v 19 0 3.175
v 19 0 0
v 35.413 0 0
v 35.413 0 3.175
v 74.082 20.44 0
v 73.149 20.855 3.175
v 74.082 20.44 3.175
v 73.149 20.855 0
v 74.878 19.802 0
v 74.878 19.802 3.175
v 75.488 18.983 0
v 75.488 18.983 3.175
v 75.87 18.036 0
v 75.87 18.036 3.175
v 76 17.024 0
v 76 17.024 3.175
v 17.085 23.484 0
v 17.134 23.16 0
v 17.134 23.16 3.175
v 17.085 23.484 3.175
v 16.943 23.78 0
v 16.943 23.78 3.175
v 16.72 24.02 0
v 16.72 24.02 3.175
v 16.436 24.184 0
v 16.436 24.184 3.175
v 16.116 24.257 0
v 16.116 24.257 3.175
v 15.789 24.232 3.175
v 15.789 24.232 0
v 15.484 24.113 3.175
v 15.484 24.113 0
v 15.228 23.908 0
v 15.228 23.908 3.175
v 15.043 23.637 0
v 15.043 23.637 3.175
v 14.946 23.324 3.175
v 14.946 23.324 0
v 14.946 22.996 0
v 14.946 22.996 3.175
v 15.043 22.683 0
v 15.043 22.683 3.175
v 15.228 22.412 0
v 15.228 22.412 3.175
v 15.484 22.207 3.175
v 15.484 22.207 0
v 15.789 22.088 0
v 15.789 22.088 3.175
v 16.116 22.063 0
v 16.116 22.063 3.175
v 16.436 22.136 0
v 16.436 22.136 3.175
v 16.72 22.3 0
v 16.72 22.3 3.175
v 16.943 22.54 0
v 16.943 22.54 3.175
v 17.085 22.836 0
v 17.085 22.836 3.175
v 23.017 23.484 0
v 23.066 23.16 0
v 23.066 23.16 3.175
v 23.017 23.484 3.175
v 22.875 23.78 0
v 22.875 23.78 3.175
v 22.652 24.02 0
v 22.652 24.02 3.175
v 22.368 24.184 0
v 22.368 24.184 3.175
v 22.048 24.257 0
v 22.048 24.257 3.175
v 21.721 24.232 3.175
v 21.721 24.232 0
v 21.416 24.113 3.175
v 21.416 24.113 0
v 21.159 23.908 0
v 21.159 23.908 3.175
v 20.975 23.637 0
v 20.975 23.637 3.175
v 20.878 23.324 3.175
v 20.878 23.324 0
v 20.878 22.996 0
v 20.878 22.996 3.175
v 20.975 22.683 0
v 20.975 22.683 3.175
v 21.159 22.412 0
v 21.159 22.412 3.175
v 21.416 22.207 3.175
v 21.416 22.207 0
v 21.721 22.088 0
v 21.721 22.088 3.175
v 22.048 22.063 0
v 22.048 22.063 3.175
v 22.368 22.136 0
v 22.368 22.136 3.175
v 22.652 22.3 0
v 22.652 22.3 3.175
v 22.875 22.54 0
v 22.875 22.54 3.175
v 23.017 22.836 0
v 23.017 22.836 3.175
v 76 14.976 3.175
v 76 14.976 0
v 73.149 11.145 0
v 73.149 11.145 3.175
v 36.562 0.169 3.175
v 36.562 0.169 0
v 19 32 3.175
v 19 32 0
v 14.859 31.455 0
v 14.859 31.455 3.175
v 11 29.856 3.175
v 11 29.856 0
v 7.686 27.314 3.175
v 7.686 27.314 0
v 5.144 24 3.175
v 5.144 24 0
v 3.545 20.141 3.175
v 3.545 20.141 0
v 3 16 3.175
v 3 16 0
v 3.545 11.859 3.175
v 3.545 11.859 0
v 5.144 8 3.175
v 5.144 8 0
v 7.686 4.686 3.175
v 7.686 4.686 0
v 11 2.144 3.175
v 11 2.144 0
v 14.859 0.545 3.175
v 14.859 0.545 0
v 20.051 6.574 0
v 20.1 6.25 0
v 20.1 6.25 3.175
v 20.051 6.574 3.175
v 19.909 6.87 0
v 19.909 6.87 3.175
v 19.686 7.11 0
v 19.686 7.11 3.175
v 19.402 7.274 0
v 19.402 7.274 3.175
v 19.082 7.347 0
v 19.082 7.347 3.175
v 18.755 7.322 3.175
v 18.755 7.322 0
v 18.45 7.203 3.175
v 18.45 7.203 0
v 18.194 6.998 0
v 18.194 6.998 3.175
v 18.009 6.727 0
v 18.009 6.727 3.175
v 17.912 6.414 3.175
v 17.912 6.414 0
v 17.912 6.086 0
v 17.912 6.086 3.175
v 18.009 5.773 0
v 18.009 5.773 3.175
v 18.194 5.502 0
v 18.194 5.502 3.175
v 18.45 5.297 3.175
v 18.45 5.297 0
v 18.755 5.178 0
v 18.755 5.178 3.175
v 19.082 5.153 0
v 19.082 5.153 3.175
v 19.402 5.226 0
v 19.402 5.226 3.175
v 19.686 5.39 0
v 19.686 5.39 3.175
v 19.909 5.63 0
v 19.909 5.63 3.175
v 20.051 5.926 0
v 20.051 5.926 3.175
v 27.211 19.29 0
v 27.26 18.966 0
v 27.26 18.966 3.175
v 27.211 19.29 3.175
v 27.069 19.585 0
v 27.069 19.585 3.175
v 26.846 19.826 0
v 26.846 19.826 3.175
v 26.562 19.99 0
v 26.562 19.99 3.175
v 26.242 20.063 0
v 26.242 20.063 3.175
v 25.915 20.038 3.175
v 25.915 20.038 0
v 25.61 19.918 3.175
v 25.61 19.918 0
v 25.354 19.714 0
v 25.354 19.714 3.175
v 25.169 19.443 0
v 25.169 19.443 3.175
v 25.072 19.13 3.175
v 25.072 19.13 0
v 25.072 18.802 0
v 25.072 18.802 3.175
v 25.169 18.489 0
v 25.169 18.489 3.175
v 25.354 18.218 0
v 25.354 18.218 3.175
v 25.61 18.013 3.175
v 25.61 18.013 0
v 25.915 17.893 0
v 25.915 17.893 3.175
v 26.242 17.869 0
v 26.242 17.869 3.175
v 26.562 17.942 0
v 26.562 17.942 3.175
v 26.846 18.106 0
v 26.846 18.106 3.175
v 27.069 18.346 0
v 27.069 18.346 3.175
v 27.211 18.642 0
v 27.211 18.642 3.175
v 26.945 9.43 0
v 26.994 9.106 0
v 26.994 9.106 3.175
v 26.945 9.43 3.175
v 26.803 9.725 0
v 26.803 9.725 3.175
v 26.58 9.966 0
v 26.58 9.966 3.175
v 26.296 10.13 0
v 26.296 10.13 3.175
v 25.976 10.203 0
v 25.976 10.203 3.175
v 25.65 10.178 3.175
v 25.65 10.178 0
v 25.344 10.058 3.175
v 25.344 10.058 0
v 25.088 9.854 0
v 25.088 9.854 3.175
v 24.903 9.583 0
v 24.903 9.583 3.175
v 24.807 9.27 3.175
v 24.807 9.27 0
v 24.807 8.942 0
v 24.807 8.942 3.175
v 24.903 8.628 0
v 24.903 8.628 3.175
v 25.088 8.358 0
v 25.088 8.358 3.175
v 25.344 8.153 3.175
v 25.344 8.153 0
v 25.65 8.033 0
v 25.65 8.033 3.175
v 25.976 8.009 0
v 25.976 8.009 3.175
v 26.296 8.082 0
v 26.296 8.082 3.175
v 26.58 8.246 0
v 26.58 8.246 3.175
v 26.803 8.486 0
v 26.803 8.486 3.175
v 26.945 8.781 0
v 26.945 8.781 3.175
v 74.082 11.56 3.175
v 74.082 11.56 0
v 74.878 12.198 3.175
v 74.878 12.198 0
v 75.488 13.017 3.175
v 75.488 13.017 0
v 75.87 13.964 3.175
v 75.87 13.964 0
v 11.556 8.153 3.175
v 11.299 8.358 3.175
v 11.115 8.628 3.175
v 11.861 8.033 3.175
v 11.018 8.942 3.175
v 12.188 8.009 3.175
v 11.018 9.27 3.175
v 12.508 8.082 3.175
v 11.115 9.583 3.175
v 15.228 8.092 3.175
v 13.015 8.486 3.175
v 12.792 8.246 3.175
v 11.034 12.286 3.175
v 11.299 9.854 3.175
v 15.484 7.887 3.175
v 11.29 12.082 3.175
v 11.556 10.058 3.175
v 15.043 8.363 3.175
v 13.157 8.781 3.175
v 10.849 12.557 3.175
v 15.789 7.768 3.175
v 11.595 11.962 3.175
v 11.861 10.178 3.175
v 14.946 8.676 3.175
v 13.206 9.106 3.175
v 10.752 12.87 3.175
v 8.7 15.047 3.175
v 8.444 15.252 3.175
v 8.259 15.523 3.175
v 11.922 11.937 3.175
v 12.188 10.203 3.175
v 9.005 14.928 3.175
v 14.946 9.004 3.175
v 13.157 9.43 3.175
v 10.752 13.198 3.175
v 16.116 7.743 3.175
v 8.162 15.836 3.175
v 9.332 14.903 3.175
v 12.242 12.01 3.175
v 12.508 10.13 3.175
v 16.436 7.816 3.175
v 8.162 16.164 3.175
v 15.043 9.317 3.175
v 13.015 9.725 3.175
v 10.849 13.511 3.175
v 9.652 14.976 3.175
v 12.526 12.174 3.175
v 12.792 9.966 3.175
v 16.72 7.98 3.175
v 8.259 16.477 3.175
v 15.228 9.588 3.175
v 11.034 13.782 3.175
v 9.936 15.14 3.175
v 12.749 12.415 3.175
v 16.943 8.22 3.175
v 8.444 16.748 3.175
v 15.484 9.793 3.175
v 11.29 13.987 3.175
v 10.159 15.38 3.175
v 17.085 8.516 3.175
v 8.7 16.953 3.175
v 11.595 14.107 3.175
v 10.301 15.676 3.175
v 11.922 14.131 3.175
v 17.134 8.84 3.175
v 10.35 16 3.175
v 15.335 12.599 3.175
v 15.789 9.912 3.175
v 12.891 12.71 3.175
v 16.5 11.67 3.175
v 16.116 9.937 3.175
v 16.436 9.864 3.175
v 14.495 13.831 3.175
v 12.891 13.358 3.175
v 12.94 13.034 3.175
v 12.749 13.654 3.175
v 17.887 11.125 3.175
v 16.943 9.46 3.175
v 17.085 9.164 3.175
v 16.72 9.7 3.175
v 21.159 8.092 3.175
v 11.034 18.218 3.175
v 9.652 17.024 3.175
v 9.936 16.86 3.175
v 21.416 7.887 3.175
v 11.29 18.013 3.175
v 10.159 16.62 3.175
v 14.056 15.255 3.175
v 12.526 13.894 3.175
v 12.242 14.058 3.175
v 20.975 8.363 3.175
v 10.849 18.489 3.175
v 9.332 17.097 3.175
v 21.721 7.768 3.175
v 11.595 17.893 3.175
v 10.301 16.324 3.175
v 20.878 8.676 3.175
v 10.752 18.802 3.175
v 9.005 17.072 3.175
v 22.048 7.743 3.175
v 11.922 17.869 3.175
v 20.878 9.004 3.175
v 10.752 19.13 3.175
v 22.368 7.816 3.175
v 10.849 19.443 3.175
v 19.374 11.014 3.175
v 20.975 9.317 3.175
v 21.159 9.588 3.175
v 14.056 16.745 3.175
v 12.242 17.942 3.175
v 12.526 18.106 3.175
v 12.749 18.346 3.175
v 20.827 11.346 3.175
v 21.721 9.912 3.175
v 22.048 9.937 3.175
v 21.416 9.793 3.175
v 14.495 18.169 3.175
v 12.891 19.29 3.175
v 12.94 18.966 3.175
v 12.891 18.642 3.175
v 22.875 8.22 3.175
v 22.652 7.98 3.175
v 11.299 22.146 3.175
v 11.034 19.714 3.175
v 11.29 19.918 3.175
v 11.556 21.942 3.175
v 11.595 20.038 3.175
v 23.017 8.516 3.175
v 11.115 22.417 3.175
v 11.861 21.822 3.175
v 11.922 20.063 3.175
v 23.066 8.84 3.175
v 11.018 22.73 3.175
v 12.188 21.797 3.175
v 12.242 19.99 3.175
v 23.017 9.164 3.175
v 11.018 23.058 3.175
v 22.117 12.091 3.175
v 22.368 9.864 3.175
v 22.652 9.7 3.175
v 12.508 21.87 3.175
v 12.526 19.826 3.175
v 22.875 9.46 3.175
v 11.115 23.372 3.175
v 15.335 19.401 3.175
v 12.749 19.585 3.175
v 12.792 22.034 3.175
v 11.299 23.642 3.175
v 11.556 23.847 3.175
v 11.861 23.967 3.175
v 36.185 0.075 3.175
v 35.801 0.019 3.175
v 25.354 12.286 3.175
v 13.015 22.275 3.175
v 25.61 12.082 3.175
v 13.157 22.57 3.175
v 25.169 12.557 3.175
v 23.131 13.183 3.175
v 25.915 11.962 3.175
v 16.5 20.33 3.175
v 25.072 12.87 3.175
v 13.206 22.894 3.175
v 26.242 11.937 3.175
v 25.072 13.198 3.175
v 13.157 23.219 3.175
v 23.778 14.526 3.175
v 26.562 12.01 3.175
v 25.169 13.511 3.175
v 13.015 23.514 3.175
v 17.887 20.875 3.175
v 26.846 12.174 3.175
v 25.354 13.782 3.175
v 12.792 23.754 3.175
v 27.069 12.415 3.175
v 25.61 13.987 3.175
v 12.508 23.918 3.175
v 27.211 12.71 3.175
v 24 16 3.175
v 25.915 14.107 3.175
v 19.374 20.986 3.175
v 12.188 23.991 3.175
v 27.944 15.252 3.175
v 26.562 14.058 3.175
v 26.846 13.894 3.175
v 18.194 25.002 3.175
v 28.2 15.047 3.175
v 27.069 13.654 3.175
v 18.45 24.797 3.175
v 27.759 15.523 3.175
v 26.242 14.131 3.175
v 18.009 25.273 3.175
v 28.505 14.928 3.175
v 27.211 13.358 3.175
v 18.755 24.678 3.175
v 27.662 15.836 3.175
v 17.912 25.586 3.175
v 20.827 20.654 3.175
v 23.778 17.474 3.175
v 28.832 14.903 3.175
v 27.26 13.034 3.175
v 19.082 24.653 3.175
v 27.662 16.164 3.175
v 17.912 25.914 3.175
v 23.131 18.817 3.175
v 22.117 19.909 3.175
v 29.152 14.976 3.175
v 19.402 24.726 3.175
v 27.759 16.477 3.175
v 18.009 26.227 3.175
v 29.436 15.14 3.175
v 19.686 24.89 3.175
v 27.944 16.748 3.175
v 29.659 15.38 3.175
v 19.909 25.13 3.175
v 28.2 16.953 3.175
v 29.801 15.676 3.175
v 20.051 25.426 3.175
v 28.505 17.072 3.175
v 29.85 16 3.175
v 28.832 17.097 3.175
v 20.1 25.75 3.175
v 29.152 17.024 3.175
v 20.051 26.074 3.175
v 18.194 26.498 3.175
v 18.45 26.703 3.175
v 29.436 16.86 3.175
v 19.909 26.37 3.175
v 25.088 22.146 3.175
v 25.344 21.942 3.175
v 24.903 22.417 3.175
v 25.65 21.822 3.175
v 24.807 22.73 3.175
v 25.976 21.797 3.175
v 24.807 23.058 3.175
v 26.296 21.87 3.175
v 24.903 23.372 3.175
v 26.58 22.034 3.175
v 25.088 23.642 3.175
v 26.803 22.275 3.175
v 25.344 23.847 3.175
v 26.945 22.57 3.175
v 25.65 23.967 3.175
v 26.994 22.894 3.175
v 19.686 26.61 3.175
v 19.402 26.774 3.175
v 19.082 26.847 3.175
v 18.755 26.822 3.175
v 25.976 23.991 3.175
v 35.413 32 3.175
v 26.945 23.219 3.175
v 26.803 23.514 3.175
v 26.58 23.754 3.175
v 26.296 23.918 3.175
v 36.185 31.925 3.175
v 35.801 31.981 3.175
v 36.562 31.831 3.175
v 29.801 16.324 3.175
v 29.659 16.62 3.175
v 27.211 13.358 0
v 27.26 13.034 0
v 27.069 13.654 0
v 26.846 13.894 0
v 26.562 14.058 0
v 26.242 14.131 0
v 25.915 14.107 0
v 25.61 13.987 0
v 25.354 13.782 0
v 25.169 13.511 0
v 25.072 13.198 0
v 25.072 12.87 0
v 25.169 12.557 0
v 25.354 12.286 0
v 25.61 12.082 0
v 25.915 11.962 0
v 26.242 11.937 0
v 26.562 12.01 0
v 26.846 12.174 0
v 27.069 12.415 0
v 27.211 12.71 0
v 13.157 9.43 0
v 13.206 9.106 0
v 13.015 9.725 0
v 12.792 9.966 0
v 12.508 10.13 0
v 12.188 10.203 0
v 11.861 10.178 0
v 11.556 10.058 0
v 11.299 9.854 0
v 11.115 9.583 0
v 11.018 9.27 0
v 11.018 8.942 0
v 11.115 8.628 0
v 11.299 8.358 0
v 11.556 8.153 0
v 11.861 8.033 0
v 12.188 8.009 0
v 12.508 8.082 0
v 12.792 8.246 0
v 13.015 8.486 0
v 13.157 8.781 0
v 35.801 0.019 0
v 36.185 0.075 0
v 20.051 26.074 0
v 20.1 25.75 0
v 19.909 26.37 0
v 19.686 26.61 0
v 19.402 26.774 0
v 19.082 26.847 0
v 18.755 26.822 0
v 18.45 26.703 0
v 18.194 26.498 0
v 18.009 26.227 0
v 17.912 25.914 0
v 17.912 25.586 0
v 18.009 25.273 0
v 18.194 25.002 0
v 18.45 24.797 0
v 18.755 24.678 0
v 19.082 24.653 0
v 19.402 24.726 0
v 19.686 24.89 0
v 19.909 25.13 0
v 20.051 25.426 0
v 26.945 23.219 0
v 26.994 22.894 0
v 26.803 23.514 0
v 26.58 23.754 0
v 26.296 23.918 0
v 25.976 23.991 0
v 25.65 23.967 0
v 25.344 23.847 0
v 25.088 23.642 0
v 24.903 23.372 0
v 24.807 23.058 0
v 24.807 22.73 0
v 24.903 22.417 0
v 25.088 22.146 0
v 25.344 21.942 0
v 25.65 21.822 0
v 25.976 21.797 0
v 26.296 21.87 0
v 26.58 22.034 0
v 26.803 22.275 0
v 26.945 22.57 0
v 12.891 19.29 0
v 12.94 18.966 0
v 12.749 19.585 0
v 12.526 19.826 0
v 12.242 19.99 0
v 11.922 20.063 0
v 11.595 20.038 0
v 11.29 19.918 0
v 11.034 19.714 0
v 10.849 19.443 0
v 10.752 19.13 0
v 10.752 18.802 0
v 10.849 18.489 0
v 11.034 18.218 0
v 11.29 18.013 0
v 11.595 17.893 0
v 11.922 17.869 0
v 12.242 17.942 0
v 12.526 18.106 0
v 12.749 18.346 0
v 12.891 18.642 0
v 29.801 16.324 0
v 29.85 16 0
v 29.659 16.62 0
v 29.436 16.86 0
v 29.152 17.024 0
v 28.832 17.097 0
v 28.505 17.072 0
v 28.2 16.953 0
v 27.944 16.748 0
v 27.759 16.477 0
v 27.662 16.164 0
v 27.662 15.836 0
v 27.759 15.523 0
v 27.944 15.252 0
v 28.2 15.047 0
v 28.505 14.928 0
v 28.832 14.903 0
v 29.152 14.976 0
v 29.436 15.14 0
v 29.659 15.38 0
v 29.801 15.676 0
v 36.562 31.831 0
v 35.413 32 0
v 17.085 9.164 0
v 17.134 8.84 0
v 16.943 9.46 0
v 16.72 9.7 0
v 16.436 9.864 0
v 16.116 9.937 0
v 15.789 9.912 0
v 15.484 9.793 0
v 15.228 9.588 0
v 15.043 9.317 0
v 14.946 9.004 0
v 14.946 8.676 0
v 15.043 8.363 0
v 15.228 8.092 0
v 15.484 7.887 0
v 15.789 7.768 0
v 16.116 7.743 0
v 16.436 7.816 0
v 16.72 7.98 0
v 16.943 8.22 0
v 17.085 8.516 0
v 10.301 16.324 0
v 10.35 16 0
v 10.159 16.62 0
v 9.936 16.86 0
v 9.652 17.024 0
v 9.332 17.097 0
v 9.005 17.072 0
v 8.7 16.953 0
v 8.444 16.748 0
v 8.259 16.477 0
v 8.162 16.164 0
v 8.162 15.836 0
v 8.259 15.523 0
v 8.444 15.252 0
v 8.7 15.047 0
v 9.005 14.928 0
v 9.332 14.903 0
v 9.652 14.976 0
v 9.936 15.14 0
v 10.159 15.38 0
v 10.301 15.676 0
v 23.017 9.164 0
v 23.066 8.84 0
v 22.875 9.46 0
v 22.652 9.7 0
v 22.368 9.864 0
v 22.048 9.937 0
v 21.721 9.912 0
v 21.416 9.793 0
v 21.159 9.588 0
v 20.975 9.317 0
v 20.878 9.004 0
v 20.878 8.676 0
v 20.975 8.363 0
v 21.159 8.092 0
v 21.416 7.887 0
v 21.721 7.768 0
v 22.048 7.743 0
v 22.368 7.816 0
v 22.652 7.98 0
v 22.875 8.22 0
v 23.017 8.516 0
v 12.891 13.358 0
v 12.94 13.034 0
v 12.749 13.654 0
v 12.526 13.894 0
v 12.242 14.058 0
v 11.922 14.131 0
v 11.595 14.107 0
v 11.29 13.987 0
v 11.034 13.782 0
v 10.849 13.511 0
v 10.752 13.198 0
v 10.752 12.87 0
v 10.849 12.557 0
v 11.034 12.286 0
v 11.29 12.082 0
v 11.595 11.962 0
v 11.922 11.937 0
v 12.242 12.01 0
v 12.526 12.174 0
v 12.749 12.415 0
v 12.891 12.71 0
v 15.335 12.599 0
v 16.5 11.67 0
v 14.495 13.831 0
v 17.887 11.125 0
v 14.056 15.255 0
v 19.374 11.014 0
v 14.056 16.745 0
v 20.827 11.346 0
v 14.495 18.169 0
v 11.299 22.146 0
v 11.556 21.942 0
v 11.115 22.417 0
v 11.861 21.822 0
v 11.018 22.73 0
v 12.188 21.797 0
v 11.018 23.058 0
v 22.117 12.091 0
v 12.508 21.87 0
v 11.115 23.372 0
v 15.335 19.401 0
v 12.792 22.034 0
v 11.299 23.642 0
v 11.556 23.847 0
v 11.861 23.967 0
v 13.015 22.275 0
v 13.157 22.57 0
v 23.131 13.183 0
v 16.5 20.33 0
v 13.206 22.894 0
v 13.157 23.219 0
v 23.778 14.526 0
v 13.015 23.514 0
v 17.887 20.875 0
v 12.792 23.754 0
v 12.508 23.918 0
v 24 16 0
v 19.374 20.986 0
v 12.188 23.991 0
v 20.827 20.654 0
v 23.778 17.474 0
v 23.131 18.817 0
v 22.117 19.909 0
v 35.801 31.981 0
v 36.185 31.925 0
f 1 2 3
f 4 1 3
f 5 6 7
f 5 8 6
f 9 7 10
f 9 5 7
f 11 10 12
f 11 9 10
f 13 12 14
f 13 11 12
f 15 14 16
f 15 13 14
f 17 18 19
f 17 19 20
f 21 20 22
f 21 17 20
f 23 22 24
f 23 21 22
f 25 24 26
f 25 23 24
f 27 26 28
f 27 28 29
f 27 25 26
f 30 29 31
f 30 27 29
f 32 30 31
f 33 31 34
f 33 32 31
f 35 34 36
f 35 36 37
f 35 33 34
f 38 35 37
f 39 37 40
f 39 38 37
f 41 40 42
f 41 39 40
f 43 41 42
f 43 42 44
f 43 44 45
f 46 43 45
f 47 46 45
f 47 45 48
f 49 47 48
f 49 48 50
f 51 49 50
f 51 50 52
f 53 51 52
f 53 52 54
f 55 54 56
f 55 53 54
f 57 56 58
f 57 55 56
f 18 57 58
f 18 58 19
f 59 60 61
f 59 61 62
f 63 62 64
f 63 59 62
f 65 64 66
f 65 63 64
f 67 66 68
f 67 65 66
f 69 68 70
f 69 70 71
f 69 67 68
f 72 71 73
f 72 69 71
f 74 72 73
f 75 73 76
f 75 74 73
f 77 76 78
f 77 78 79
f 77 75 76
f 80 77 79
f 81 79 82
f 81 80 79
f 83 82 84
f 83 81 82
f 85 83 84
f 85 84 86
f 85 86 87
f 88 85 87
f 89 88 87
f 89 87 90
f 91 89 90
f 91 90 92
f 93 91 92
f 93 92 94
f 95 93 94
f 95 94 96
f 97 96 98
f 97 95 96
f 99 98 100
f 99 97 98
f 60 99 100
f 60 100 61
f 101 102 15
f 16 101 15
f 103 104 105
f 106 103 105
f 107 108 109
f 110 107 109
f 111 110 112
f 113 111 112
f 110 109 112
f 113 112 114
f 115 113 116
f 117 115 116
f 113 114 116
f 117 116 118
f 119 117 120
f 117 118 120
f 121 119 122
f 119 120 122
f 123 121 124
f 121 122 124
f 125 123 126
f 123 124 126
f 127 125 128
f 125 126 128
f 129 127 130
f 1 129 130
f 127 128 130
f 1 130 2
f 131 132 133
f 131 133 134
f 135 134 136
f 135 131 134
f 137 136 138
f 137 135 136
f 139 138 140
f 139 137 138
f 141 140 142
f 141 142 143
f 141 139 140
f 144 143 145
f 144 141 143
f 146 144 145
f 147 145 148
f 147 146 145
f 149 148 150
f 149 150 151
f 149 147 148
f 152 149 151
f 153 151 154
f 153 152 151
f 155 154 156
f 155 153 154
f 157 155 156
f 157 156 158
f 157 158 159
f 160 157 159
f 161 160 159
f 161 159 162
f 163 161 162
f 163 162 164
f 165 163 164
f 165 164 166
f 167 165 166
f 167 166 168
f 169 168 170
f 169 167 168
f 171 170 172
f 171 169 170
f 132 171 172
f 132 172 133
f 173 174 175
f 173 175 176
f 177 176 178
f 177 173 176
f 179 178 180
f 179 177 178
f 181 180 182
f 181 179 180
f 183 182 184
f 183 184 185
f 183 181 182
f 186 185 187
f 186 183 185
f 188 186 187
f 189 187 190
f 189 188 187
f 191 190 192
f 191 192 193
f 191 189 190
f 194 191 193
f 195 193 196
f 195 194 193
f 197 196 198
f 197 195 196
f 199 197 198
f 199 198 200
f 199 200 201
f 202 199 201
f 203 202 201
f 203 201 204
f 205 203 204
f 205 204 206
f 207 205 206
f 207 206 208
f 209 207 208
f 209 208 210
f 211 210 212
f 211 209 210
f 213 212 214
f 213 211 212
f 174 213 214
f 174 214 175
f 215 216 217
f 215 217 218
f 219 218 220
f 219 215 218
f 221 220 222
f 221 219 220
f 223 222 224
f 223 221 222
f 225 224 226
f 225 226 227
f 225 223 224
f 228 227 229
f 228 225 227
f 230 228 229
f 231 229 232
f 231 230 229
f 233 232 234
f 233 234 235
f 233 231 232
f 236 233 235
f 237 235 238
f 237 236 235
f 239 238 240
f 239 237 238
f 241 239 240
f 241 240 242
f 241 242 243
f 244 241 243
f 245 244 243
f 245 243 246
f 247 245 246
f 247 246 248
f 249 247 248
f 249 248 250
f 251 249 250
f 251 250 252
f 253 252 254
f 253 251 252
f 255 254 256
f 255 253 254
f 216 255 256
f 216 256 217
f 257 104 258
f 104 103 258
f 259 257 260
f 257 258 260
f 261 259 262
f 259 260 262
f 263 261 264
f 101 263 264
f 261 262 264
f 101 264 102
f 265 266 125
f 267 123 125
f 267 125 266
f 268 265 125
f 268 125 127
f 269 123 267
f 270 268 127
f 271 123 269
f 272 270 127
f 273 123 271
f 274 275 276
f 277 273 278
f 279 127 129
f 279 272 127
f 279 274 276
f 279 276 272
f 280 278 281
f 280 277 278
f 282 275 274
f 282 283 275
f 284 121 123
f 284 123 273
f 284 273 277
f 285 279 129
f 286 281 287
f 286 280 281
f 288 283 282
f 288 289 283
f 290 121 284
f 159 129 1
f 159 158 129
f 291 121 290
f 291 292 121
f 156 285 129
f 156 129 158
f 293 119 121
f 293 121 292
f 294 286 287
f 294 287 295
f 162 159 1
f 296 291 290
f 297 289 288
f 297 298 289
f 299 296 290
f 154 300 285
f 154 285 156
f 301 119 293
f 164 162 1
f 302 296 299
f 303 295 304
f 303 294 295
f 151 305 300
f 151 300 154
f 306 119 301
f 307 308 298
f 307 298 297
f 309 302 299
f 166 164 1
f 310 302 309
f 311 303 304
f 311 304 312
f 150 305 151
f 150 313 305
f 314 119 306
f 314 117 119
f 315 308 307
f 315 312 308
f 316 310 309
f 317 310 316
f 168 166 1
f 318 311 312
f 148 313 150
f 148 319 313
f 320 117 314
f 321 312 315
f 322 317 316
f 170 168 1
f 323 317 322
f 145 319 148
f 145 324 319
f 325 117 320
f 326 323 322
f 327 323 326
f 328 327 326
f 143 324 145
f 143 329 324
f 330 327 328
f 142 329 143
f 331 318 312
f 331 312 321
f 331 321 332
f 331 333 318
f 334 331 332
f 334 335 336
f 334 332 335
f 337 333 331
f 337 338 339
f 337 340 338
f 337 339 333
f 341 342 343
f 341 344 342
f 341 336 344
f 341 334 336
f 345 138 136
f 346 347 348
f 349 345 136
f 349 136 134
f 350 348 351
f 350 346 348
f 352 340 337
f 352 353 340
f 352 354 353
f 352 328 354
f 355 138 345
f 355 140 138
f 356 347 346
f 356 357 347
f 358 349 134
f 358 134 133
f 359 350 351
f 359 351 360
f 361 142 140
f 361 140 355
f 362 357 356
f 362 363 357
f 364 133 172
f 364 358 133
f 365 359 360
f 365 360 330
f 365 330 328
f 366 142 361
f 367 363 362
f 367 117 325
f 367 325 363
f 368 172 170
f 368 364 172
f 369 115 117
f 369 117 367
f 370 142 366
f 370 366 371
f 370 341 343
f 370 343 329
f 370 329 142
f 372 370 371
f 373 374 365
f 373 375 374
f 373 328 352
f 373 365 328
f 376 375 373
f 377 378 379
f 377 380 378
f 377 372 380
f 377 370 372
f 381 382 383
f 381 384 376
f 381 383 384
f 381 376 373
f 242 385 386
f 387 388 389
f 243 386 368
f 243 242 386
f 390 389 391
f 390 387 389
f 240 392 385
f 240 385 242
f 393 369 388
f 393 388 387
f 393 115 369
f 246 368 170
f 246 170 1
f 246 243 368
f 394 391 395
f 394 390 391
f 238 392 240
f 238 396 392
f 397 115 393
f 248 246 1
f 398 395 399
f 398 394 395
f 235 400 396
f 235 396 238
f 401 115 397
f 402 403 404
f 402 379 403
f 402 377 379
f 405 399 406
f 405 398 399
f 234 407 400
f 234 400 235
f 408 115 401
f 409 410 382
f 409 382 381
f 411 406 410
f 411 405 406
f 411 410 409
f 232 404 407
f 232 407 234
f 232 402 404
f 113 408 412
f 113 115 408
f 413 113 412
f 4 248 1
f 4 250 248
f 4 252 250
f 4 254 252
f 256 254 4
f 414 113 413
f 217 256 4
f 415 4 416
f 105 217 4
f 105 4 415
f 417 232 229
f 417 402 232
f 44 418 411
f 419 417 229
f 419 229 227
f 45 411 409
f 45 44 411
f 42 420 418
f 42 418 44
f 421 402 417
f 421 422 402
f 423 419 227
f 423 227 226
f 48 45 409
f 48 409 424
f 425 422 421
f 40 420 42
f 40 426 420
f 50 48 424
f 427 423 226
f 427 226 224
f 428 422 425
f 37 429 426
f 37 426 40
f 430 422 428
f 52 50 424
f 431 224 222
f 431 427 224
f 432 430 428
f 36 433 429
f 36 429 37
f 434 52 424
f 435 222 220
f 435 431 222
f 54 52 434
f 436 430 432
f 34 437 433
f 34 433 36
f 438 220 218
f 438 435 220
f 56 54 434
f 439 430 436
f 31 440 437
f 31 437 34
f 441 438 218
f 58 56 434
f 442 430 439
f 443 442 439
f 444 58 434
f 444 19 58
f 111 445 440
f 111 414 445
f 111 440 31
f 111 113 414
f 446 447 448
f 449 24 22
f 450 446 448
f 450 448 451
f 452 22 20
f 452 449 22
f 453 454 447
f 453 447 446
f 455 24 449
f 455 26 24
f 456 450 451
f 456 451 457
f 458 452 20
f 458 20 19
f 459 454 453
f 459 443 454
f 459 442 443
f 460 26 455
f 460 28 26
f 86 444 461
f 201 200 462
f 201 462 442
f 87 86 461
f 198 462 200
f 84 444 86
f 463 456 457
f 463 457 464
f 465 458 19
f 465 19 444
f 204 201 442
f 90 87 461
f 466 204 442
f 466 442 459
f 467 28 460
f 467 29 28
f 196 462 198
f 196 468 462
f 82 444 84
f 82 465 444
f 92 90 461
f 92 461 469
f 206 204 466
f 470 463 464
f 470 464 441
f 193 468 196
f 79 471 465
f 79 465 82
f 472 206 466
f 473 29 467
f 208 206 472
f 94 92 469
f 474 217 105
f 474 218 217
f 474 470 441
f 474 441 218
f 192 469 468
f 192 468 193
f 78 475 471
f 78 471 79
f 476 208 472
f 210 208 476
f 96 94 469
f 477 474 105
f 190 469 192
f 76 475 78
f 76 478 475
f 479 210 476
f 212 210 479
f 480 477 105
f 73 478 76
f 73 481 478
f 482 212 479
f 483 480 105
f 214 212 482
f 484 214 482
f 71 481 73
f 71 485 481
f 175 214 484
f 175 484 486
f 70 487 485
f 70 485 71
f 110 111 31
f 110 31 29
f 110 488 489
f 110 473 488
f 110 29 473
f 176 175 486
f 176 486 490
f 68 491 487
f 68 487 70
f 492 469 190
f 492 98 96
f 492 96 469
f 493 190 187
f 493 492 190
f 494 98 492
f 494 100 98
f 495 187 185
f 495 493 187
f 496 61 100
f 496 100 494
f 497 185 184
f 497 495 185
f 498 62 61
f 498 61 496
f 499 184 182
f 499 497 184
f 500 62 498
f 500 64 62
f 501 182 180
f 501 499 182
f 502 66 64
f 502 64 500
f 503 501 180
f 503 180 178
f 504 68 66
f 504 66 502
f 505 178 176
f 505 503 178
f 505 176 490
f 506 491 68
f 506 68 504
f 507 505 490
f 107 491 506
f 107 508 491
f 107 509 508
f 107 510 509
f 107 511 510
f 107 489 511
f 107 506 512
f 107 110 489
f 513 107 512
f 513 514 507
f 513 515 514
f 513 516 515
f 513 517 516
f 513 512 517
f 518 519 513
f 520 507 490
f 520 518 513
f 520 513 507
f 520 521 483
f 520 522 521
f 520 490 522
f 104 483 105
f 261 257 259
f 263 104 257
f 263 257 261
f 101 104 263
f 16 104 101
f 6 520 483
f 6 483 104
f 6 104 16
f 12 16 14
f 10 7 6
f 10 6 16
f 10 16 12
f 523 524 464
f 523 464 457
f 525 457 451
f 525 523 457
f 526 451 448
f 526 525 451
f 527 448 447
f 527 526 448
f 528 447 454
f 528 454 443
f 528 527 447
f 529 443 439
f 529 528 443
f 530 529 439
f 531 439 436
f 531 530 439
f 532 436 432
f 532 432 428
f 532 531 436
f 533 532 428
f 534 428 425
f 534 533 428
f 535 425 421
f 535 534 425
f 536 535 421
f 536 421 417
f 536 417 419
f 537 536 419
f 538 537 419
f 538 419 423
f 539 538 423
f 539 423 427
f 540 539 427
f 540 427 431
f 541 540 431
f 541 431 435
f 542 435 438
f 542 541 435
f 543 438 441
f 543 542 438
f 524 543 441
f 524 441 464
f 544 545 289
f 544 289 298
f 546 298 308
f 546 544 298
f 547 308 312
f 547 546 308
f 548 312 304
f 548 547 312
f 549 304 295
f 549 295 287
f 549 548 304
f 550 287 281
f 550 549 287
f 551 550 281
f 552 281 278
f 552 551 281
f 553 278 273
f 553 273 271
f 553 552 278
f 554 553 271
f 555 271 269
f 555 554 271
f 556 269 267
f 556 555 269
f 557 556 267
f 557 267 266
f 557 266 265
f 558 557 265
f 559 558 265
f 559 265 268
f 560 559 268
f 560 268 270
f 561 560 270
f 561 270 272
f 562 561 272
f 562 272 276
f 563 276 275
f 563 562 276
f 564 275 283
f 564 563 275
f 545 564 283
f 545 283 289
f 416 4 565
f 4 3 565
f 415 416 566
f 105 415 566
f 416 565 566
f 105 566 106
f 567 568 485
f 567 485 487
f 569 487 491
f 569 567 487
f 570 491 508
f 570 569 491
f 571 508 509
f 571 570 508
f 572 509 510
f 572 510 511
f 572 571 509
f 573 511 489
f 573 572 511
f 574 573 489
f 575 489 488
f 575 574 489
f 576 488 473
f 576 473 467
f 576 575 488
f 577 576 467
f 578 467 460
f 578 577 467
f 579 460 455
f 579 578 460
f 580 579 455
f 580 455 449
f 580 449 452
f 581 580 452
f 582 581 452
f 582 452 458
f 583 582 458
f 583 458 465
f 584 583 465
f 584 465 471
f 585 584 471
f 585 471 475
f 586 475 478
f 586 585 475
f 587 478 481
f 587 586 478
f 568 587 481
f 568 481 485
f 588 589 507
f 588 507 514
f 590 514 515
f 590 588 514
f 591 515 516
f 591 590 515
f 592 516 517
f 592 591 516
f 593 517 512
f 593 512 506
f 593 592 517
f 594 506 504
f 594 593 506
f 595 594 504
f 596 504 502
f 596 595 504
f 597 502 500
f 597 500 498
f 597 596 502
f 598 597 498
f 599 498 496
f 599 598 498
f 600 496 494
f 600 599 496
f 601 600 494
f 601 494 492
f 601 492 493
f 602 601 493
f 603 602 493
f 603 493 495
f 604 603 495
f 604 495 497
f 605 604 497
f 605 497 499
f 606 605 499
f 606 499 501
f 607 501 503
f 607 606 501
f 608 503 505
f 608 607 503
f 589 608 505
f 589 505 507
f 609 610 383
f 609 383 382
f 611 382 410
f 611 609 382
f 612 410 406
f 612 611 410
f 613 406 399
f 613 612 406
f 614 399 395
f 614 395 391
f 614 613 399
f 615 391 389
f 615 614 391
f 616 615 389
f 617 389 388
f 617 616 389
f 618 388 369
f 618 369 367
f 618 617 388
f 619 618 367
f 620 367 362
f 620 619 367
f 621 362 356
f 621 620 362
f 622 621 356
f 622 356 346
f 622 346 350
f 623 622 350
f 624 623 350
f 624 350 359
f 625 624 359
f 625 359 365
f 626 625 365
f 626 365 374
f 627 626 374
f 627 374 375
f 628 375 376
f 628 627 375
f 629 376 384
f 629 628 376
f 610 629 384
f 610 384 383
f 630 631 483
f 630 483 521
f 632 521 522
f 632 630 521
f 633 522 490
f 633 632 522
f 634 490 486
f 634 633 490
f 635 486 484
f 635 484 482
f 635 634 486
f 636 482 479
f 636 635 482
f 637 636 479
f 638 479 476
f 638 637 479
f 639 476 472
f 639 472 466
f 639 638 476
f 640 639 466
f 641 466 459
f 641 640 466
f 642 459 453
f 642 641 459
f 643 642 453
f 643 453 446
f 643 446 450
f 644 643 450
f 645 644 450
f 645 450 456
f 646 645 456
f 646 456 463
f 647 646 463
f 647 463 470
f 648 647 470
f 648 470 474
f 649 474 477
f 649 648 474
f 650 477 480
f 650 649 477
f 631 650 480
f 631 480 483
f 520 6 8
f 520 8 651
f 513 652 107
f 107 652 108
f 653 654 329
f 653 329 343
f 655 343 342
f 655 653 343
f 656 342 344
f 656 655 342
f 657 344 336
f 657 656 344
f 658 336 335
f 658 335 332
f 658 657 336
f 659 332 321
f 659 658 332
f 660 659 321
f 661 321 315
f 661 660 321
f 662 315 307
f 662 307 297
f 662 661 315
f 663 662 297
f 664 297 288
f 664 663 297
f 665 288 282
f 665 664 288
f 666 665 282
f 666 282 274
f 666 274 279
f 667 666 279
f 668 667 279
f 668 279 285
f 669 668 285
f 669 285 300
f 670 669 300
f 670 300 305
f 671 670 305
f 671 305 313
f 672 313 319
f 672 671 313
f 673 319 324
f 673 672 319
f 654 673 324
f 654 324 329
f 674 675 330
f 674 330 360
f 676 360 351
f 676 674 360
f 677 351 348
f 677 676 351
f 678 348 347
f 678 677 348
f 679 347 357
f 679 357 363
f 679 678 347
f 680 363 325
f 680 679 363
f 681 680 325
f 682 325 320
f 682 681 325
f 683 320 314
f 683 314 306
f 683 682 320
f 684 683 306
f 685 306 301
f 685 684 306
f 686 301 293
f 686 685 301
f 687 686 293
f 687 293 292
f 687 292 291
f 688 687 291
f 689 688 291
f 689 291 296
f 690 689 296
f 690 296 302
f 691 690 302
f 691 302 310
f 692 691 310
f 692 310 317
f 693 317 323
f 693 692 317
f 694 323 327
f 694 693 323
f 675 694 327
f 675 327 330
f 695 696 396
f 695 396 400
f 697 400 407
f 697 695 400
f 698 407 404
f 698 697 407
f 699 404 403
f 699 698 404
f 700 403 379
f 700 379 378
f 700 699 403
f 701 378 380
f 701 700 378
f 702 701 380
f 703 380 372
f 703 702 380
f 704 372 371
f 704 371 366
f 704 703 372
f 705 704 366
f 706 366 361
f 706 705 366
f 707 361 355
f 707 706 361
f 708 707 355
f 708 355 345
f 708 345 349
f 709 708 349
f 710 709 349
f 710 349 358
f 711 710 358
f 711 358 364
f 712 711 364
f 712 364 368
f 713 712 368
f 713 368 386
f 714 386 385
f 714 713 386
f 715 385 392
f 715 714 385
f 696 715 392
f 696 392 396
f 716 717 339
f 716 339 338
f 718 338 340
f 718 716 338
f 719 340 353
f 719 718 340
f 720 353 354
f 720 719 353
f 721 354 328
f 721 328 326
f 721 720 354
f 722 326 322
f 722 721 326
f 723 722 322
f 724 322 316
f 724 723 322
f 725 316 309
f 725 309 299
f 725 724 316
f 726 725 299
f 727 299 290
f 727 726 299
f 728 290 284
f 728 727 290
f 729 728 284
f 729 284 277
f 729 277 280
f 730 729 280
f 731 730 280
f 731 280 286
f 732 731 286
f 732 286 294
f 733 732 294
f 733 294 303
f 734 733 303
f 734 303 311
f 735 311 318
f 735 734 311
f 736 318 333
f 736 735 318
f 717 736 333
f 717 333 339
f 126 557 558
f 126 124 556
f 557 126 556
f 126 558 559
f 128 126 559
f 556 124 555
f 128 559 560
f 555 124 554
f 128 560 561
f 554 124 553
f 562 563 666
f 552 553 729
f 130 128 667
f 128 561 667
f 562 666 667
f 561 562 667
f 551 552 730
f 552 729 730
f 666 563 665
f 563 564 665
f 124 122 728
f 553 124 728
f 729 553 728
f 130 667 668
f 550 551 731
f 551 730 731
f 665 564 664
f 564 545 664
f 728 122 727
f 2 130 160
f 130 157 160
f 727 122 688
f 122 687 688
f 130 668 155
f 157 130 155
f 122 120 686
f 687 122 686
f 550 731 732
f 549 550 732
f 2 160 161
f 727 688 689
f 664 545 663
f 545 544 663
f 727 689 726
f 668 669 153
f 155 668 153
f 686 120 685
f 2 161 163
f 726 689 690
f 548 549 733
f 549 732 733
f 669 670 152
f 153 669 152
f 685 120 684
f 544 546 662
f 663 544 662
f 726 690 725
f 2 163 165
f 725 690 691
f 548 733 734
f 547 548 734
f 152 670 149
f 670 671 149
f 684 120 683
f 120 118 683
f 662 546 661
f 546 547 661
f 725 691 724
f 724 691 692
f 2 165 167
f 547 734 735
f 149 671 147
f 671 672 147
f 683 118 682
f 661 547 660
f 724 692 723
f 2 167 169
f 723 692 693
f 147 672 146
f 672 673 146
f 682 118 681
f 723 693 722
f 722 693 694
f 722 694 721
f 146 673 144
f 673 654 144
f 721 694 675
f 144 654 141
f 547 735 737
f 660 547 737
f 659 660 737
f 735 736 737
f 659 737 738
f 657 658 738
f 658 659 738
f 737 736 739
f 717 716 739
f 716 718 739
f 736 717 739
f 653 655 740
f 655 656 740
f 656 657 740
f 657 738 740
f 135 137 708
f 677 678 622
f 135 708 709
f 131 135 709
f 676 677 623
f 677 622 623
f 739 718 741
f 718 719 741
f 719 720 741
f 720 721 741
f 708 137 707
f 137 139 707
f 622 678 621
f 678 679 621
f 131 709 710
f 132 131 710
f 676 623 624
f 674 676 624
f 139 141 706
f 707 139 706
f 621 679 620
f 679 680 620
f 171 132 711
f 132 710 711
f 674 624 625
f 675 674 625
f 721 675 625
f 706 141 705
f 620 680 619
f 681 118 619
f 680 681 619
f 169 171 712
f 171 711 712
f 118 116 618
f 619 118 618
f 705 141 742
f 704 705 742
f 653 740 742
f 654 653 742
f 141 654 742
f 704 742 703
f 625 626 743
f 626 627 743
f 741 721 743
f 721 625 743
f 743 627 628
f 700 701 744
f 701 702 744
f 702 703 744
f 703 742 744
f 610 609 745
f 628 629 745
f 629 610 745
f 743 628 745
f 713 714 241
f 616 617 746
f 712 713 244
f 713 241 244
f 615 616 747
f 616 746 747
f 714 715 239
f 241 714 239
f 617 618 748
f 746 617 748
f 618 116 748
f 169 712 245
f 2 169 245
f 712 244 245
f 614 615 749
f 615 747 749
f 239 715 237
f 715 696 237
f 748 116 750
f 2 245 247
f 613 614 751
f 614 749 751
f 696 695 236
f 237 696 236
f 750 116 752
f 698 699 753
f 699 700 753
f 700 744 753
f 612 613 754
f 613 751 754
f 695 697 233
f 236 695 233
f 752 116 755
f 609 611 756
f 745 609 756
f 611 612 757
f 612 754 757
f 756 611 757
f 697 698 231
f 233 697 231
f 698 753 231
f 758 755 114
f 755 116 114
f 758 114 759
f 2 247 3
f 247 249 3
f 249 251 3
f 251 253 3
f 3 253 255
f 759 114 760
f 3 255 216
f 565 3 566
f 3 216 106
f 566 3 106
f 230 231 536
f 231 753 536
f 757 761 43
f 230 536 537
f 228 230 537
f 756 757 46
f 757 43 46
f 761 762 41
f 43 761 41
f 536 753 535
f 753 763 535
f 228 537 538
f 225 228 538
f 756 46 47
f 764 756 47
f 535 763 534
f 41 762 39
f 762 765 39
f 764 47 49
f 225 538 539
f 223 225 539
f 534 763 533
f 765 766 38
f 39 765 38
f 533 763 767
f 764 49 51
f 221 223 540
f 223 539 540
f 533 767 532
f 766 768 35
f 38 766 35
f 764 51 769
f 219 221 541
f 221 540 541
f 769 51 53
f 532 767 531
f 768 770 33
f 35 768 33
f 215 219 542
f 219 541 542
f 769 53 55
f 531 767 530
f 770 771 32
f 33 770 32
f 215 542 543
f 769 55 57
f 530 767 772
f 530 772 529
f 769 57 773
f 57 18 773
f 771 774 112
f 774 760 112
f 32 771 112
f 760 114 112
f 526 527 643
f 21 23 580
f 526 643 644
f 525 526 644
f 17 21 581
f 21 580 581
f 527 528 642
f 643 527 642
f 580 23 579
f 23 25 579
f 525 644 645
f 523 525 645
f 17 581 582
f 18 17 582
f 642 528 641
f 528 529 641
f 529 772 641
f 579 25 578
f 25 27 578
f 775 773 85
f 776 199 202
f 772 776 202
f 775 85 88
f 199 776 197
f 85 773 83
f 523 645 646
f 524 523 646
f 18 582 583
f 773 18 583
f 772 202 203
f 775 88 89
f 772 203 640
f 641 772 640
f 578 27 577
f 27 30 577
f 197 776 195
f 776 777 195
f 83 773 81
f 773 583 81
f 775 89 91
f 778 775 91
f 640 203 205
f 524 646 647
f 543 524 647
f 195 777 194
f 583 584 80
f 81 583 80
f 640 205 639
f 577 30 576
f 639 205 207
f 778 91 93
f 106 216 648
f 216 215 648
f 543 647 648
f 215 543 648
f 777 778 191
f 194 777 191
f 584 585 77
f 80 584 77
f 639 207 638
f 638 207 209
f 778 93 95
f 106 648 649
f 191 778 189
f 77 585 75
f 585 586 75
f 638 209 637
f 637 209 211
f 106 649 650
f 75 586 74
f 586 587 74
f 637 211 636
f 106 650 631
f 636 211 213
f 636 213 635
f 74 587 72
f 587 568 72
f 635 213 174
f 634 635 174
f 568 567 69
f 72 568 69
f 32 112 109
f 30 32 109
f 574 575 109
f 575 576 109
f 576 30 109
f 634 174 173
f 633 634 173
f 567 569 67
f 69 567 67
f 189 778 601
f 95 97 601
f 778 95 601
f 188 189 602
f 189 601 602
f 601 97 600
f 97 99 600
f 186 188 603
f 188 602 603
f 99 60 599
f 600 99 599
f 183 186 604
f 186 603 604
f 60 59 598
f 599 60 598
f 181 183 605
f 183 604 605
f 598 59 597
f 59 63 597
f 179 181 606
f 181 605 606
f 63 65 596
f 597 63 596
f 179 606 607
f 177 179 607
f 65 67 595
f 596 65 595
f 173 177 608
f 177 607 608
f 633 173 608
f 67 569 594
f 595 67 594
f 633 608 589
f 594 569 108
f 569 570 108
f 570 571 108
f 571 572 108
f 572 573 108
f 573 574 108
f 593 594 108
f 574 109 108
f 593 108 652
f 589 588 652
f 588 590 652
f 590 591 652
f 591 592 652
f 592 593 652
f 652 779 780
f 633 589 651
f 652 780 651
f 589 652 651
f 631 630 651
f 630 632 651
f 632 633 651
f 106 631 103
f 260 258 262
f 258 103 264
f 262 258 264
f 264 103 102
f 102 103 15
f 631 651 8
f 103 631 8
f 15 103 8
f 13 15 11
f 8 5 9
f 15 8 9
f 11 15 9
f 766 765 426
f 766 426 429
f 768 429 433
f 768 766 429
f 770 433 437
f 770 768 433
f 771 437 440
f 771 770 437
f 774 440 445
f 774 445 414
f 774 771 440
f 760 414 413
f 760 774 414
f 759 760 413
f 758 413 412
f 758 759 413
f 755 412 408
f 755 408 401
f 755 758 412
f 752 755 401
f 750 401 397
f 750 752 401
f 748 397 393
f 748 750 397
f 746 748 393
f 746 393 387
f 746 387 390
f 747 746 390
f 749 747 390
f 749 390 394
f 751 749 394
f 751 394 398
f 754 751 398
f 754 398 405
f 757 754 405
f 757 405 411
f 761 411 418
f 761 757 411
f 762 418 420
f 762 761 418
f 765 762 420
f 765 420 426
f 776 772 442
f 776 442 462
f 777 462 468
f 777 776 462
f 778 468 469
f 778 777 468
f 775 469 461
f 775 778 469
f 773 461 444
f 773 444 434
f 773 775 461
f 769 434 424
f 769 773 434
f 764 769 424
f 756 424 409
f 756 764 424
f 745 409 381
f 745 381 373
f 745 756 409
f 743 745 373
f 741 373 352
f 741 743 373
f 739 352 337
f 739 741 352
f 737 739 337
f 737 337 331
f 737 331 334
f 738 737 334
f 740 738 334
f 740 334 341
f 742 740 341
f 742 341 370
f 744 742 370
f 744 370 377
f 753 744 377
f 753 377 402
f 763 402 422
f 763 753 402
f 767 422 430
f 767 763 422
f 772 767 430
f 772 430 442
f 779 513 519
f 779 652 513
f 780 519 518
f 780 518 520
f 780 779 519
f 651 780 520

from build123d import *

# Parameters (mm, degrees)
SKETCH1_R           = 1.1
SKETCH1_R_2         = 5
BOSS_EXTRUDE1_DEPTH = 3.175
CUT_EXTRUDE1_DEPTH  = 3.175
FILLET1_R           = 4


with BuildPart() as part:
    # Sketch1 → Boss-Extrude1 (new body)
    with BuildSketch(Plane.XY):
        with BuildLine():
            Line((19, 0), (76, 0))
            Line((76, 0), (76, 32))
            Line((76, 32), (19, 32))
            ThreePointArc((19, 32), (3, 16), (19, 0))
        make_face()
        with Locations((25.894291117, 22.894291117)):
            Circle(SKETCH1_R, mode=Mode.SUBTRACT)
        with Locations((19, 25.75)):
            Circle(SKETCH1_R, mode=Mode.SUBTRACT)
        with Locations((28.75, 16)):
            Circle(SKETCH1_R, mode=Mode.SUBTRACT)
        with Locations((25.894291117, 9.105708883)):
            Circle(SKETCH1_R, mode=Mode.SUBTRACT)
        with Locations((19, 6.25)):
            Circle(SKETCH1_R, mode=Mode.SUBTRACT)
        with Locations((12.105708883, 9.105708883)):
            Circle(SKETCH1_R, mode=Mode.SUBTRACT)
        with Locations((9.25, 16)):
            Circle(SKETCH1_R, mode=Mode.SUBTRACT)
        with Locations((12.105708883, 22.894291117)):
            Circle(SKETCH1_R, mode=Mode.SUBTRACT)
        with Locations((19, 16)):
            Circle(SKETCH1_R_2, mode=Mode.SUBTRACT)
        with Locations((26.160066377, 18.965796601)):
            Circle(SKETCH1_R, mode=Mode.SUBTRACT)
        with Locations((21.965796601, 23.160066377)):
            Circle(SKETCH1_R, mode=Mode.SUBTRACT)
        with Locations((26.160066377, 13.034203399)):
            Circle(SKETCH1_R, mode=Mode.SUBTRACT)
        with Locations((21.965796601, 8.839933623)):
            Circle(SKETCH1_R, mode=Mode.SUBTRACT)
        with Locations((16.034203399, 8.839933623)):
            Circle(SKETCH1_R, mode=Mode.SUBTRACT)
        with Locations((11.839933623, 13.034203399)):
            Circle(SKETCH1_R, mode=Mode.SUBTRACT)
        with Locations((11.839933623, 18.965796601)):
            Circle(SKETCH1_R, mode=Mode.SUBTRACT)
        with Locations((16.034203399, 23.160066377)):
            Circle(SKETCH1_R, mode=Mode.SUBTRACT)
    extrude(amount=BOSS_EXTRUDE1_DEPTH)

    # Sketch2 → Cut-Extrude1 (cut)
    with BuildSketch(Plane.XY.offset(3.175)):
        Polygon((76, 32), (76, 20), (36, 32), align=None)
        Polygon((76, 0), (76, 12), (36, 0), align=None)
    extrude(amount=-CUT_EXTRUDE1_DEPTH, mode=Mode.SUBTRACT)

    # Fillet1
    fillet1_edges = [part.edges().sort_by_distance(p)[0] for p in [
        (36, 0, 1.5875),
        (76, 12, 1.5875),
        (36, 32, 1.5875),
        (76, 20, 1.5875),
    ]]
    fillet(fillet1_edges, radius=FILLET1_R)


solid = part.part
